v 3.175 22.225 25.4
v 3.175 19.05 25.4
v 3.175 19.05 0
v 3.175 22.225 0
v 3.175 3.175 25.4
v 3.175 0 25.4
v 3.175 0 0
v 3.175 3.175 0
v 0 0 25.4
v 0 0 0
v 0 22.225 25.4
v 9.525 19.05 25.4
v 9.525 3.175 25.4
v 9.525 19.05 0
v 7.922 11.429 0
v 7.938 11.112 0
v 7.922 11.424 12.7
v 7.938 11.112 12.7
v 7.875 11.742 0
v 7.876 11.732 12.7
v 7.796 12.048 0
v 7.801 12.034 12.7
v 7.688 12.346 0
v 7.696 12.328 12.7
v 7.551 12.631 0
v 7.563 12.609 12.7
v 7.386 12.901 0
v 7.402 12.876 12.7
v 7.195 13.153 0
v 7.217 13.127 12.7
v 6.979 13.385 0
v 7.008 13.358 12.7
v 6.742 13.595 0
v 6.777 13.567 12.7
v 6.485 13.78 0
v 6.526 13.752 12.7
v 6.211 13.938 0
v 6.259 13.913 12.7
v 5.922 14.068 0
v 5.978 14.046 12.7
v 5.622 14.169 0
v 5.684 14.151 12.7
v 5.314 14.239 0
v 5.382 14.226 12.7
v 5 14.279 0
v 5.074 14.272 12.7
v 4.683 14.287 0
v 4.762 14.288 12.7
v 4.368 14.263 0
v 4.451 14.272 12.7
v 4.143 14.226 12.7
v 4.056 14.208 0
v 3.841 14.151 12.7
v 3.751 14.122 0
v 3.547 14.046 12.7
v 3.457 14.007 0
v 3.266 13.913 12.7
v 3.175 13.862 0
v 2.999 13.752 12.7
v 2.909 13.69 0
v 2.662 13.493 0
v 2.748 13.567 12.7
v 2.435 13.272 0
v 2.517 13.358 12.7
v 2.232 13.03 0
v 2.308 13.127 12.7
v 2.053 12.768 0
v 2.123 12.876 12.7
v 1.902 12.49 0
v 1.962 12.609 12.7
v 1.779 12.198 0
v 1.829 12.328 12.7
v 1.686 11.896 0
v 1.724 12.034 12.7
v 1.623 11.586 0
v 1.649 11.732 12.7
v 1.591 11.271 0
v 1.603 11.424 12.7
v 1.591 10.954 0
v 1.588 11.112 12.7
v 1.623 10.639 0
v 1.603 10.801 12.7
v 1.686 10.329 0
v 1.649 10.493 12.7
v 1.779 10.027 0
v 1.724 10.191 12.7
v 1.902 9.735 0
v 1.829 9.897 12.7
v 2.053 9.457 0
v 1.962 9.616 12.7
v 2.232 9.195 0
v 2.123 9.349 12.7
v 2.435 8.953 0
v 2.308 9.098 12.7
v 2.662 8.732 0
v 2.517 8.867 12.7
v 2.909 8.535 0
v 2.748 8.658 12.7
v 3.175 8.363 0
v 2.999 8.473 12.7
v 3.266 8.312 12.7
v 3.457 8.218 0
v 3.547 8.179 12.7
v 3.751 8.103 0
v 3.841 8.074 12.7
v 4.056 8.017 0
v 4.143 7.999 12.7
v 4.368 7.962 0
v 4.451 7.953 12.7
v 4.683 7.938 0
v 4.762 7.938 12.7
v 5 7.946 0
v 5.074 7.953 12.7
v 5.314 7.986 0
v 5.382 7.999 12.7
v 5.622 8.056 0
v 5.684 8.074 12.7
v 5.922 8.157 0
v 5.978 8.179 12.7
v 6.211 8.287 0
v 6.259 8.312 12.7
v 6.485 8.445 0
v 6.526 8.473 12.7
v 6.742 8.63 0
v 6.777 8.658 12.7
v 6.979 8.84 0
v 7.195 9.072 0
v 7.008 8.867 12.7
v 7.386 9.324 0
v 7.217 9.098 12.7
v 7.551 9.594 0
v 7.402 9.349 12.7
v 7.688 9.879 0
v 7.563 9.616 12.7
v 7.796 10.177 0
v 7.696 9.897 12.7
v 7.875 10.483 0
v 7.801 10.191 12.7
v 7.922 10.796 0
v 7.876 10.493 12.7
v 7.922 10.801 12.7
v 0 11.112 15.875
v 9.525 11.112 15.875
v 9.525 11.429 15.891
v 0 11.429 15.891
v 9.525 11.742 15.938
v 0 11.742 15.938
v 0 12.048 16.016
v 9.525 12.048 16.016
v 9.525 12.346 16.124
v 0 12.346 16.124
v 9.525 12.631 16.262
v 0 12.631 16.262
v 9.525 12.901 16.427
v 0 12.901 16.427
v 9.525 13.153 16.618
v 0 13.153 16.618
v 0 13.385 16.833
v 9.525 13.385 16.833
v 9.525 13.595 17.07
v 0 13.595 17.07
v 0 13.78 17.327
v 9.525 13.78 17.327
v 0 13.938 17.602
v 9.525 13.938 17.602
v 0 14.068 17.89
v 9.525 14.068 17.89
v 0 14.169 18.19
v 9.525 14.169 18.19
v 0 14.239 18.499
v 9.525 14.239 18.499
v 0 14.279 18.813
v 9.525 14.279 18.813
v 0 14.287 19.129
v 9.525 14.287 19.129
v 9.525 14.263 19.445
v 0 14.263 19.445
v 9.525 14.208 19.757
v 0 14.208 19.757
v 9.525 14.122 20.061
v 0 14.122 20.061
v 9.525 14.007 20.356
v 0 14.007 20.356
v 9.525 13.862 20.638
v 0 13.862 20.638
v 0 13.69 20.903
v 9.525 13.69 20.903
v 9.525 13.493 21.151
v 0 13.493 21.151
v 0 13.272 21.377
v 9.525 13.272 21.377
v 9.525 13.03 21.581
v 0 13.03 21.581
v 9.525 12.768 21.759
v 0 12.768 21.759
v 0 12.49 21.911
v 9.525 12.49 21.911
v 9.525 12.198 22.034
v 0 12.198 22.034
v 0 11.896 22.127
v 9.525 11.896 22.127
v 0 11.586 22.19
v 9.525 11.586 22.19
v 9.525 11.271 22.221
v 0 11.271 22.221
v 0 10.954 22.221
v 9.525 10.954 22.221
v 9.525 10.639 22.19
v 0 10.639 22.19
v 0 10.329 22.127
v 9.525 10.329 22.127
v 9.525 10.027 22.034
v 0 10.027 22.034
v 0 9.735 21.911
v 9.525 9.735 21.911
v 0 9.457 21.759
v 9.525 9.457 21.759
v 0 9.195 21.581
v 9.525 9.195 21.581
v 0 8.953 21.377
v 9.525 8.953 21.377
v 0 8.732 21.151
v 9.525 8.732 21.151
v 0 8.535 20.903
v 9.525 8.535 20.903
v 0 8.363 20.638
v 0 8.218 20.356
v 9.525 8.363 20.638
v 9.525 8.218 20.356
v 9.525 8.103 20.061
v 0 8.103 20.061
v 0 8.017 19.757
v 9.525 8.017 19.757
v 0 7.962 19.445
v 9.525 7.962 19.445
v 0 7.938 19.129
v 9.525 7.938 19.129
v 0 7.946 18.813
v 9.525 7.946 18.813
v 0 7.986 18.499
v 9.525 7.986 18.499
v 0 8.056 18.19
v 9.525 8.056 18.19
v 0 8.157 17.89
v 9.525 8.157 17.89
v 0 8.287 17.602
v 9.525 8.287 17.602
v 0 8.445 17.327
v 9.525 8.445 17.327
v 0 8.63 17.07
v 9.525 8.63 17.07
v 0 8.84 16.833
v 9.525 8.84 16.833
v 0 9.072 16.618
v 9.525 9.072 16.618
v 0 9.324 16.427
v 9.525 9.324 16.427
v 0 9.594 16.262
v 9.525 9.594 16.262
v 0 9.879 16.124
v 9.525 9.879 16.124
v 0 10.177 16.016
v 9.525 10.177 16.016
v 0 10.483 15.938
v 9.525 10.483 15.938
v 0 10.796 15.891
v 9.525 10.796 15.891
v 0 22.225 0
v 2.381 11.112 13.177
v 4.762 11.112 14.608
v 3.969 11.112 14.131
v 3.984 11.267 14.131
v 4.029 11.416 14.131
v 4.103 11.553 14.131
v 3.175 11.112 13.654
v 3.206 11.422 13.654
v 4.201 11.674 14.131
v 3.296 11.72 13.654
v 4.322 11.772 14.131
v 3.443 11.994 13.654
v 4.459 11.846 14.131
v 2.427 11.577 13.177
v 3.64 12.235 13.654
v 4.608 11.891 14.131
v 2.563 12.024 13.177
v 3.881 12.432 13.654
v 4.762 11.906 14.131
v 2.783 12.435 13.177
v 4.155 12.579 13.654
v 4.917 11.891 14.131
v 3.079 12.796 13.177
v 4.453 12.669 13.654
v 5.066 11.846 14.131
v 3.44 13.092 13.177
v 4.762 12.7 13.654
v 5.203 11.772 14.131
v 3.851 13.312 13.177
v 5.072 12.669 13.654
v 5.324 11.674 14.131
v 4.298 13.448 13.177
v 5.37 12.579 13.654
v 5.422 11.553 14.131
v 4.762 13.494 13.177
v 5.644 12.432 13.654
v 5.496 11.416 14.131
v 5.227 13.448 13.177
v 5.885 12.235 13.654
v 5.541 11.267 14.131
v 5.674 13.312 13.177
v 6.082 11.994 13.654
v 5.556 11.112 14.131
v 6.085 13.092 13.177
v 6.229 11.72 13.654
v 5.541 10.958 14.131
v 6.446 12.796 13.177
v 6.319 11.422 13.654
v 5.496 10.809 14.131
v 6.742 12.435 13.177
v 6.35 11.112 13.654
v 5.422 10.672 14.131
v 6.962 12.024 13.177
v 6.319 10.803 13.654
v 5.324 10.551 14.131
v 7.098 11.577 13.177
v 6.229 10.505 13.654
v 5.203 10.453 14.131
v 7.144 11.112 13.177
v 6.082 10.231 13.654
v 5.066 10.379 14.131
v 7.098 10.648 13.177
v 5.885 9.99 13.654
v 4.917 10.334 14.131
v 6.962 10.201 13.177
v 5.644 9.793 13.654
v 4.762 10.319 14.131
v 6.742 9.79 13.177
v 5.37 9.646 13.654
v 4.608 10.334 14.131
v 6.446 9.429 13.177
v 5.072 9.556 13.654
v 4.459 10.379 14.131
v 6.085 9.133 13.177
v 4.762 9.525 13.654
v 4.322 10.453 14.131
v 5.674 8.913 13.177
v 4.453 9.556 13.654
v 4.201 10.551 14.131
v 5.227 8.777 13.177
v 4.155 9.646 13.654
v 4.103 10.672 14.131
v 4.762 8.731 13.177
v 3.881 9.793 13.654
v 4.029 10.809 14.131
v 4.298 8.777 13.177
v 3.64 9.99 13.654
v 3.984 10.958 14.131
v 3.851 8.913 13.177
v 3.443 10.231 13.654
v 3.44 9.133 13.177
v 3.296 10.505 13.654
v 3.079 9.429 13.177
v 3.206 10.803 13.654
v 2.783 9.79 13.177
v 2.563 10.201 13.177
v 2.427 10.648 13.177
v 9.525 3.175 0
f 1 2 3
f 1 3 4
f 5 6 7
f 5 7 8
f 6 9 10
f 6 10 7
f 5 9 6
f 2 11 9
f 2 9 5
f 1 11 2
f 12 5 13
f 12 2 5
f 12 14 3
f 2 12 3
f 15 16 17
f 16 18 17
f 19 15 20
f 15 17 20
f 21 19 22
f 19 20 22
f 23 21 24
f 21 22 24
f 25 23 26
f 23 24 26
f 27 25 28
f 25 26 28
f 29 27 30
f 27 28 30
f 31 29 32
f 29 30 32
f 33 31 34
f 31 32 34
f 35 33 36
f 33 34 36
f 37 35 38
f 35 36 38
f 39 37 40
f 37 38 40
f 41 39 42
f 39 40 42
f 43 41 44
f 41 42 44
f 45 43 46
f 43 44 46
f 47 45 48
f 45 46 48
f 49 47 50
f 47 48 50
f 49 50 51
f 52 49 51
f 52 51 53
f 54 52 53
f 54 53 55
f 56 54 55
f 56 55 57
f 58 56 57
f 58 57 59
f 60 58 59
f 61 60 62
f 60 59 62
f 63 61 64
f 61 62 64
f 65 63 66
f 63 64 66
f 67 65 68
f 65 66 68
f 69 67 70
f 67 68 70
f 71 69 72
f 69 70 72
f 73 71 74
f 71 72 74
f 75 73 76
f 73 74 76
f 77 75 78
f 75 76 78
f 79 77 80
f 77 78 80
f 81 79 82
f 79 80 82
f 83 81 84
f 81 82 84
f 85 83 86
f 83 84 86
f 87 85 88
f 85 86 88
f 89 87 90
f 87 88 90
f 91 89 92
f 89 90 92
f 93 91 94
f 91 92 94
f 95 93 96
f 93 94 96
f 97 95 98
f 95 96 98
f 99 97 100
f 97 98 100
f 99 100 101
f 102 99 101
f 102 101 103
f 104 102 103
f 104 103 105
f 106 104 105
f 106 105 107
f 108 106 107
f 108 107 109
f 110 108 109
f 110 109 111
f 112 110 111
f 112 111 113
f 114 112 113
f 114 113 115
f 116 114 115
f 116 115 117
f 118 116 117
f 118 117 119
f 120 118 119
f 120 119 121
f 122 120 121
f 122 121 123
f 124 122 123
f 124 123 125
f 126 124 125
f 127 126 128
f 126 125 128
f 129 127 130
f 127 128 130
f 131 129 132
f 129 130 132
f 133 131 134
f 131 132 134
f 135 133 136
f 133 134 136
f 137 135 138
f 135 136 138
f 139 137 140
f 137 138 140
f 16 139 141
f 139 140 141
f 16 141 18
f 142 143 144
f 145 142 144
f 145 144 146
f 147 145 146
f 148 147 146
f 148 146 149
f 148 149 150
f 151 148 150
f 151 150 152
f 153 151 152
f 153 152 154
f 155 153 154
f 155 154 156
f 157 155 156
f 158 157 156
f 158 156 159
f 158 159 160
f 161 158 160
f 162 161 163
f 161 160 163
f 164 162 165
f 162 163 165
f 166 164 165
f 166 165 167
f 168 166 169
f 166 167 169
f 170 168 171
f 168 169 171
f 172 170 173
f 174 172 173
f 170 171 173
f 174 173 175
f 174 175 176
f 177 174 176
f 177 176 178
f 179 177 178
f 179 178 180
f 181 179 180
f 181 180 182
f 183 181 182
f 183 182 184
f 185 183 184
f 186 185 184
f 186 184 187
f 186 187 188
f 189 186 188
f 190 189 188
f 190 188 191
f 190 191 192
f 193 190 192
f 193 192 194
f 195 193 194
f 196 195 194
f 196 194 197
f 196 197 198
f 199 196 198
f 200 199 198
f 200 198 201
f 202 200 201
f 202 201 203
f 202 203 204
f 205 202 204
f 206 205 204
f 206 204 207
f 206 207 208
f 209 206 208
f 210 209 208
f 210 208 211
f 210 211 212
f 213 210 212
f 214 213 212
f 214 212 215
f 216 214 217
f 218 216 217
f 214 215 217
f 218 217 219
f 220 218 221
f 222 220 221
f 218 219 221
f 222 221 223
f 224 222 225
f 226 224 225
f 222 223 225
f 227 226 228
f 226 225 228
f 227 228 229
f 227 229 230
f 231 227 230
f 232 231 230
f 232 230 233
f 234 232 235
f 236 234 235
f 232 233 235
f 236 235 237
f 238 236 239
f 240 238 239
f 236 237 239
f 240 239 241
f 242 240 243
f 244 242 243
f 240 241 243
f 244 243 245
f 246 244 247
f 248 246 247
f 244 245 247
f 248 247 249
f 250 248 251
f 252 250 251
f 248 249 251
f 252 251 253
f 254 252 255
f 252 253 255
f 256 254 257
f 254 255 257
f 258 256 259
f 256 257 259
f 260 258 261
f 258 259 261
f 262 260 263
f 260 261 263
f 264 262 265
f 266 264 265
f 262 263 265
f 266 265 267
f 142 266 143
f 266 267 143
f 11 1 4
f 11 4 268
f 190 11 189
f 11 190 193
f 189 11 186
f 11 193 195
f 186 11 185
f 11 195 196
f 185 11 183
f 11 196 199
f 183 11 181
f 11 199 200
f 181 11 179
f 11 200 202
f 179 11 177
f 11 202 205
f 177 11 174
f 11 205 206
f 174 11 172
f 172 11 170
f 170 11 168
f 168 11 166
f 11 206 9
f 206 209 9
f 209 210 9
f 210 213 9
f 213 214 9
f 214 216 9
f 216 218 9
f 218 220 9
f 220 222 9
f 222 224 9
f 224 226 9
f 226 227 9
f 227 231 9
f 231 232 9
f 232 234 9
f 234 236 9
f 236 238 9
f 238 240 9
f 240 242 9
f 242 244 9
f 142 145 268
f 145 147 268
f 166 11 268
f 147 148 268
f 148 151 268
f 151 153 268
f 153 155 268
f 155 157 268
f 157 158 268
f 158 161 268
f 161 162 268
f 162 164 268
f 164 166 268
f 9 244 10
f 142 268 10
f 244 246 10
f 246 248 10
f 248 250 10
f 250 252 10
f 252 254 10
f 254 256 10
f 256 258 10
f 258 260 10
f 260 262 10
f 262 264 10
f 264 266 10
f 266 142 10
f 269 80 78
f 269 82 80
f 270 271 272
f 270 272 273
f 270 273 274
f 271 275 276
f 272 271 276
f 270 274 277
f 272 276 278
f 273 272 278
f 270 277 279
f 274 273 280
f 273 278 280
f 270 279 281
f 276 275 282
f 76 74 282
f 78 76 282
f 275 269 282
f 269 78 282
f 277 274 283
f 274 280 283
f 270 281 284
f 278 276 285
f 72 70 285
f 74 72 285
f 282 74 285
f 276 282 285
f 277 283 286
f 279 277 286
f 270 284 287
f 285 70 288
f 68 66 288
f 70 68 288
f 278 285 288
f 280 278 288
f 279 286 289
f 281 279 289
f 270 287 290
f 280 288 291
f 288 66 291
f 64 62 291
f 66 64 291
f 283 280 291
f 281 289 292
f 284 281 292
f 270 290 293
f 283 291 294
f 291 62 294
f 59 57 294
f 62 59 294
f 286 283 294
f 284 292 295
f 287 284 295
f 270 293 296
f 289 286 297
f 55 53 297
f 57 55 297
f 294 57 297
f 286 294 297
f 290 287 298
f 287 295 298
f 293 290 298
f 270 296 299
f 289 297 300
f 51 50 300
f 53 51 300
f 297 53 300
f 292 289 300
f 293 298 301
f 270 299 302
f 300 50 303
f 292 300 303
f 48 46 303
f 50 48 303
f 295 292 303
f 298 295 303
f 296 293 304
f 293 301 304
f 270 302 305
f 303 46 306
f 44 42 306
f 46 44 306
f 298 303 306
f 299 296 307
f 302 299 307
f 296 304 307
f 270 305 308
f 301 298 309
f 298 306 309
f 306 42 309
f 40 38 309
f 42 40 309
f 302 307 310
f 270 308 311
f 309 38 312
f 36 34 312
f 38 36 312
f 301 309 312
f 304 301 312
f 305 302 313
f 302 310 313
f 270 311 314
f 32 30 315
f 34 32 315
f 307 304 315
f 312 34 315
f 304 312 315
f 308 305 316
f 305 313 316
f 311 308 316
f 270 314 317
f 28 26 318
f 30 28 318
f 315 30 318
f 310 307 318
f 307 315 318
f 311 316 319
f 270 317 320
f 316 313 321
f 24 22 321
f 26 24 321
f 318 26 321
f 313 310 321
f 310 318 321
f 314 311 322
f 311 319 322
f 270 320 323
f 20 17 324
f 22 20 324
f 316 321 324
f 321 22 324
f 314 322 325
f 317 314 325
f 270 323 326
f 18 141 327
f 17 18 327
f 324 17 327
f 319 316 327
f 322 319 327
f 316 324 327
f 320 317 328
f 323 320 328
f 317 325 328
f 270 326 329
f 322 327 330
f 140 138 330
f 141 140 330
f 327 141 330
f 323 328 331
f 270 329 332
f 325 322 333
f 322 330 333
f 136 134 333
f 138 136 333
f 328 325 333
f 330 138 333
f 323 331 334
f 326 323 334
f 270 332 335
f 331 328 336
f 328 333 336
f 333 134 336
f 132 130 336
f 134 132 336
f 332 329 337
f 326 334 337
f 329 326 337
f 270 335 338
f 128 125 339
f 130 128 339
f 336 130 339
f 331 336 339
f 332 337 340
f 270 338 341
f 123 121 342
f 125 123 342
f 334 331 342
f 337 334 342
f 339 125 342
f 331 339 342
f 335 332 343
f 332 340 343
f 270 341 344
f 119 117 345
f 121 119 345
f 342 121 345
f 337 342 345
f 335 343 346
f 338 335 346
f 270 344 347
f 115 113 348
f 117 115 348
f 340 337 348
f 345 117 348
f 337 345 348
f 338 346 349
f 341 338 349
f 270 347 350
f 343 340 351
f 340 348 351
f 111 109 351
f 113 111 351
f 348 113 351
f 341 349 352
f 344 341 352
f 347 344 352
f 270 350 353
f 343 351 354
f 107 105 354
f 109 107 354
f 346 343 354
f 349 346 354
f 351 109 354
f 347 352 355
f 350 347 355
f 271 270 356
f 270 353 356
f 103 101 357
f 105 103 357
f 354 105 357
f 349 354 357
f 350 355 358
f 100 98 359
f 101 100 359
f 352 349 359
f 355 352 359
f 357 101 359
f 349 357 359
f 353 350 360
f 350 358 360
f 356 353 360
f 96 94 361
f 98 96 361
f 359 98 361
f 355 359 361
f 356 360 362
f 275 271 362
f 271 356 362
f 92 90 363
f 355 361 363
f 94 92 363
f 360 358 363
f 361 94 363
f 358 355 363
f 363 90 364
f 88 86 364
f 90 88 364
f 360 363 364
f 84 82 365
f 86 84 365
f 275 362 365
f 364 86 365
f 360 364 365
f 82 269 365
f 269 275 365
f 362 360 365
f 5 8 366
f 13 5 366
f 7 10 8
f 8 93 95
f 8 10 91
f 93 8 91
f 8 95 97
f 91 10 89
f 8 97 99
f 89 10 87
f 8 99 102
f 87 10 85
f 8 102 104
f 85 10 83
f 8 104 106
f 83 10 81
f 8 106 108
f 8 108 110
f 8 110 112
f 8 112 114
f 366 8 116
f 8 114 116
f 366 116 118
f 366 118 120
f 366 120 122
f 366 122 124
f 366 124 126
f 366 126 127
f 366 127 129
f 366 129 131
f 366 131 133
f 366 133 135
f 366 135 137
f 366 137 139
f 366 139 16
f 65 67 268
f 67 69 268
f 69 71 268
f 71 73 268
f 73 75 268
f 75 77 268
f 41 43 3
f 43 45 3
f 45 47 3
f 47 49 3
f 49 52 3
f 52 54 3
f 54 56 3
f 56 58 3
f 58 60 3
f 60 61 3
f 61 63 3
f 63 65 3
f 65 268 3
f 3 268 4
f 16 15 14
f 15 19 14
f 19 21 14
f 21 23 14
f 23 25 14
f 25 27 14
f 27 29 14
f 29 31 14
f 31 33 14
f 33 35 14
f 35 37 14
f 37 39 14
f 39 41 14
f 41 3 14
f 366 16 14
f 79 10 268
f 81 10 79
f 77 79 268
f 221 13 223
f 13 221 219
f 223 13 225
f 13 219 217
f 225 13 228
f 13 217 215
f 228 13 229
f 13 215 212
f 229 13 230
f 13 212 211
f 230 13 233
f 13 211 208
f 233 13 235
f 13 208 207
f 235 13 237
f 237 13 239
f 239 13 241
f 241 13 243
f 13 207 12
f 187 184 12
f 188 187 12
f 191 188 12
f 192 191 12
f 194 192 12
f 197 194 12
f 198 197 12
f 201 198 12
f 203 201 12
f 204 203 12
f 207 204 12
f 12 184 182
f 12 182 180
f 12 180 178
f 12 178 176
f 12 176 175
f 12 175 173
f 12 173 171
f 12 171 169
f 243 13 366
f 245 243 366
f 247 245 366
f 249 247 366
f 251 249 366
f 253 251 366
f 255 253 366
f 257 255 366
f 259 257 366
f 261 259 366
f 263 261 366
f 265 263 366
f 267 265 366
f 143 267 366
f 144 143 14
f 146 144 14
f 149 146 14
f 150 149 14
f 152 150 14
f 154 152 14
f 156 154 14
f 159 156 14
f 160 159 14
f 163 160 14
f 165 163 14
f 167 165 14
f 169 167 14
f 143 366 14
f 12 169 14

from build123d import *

# Parameters (mm, degrees)
BOSS_EXTRUDE1_DEPTH             = 25.4
SKETCH3_R                       = 3.175
CUT_EXTRUDE1_DEPTH              = 36.06902123
F_1_4_0_25_DIAMETER_HOLE1_D     = 6.35
F_1_4_0_25_DIAMETER_HOLE1_DEPTH = 12.7
F_1_4_0_25_DIAMETER_HOLE1_TIP   = 1.907732465


with BuildPart() as part:
    # Sketch1 → Boss-Extrude1 (new body)
    with BuildSketch(Plane.XY):
        Polygon((0, 0), (3.175, 0), (3.175, 3.175), (9.525, 3.175), (9.525, 19.05), (3.175, 19.05), (3.175, 22.225), (0, 22.225), align=None)
    extrude(amount=BOSS_EXTRUDE1_DEPTH)

    # Sketch3 → Cut-Extrude1 (cut, through all)
    with BuildSketch(Plane(origin=(9.525, 0, 0), x_dir=(0, 0, -1), z_dir=(1, 0, 0))):
        with Locations((-19.05, 11.1125)):
            Circle(SKETCH3_R)
    extrude(amount=-CUT_EXTRUDE1_DEPTH, mode=Mode.SUBTRACT)

    # 1/4 (0.25) Diameter Hole1
    with Locations(Plane(origin=(0, 0, 0), x_dir=(-1, 0, 0), z_dir=(0, 0, -1))):
        with Locations((-4.7625, 11.1125)):
            Hole(F_1_4_0_25_DIAMETER_HOLE1_D / 2, depth=F_1_4_0_25_DIAMETER_HOLE1_DEPTH)
            with Locations((0, 0, -(F_1_4_0_25_DIAMETER_HOLE1_DEPTH + F_1_4_0_25_DIAMETER_HOLE1_TIP / 2))):  # 118° drill point
                Cone(0, F_1_4_0_25_DIAMETER_HOLE1_D / 2, F_1_4_0_25_DIAMETER_HOLE1_TIP, mode=Mode.SUBTRACT)


solid = part.part
